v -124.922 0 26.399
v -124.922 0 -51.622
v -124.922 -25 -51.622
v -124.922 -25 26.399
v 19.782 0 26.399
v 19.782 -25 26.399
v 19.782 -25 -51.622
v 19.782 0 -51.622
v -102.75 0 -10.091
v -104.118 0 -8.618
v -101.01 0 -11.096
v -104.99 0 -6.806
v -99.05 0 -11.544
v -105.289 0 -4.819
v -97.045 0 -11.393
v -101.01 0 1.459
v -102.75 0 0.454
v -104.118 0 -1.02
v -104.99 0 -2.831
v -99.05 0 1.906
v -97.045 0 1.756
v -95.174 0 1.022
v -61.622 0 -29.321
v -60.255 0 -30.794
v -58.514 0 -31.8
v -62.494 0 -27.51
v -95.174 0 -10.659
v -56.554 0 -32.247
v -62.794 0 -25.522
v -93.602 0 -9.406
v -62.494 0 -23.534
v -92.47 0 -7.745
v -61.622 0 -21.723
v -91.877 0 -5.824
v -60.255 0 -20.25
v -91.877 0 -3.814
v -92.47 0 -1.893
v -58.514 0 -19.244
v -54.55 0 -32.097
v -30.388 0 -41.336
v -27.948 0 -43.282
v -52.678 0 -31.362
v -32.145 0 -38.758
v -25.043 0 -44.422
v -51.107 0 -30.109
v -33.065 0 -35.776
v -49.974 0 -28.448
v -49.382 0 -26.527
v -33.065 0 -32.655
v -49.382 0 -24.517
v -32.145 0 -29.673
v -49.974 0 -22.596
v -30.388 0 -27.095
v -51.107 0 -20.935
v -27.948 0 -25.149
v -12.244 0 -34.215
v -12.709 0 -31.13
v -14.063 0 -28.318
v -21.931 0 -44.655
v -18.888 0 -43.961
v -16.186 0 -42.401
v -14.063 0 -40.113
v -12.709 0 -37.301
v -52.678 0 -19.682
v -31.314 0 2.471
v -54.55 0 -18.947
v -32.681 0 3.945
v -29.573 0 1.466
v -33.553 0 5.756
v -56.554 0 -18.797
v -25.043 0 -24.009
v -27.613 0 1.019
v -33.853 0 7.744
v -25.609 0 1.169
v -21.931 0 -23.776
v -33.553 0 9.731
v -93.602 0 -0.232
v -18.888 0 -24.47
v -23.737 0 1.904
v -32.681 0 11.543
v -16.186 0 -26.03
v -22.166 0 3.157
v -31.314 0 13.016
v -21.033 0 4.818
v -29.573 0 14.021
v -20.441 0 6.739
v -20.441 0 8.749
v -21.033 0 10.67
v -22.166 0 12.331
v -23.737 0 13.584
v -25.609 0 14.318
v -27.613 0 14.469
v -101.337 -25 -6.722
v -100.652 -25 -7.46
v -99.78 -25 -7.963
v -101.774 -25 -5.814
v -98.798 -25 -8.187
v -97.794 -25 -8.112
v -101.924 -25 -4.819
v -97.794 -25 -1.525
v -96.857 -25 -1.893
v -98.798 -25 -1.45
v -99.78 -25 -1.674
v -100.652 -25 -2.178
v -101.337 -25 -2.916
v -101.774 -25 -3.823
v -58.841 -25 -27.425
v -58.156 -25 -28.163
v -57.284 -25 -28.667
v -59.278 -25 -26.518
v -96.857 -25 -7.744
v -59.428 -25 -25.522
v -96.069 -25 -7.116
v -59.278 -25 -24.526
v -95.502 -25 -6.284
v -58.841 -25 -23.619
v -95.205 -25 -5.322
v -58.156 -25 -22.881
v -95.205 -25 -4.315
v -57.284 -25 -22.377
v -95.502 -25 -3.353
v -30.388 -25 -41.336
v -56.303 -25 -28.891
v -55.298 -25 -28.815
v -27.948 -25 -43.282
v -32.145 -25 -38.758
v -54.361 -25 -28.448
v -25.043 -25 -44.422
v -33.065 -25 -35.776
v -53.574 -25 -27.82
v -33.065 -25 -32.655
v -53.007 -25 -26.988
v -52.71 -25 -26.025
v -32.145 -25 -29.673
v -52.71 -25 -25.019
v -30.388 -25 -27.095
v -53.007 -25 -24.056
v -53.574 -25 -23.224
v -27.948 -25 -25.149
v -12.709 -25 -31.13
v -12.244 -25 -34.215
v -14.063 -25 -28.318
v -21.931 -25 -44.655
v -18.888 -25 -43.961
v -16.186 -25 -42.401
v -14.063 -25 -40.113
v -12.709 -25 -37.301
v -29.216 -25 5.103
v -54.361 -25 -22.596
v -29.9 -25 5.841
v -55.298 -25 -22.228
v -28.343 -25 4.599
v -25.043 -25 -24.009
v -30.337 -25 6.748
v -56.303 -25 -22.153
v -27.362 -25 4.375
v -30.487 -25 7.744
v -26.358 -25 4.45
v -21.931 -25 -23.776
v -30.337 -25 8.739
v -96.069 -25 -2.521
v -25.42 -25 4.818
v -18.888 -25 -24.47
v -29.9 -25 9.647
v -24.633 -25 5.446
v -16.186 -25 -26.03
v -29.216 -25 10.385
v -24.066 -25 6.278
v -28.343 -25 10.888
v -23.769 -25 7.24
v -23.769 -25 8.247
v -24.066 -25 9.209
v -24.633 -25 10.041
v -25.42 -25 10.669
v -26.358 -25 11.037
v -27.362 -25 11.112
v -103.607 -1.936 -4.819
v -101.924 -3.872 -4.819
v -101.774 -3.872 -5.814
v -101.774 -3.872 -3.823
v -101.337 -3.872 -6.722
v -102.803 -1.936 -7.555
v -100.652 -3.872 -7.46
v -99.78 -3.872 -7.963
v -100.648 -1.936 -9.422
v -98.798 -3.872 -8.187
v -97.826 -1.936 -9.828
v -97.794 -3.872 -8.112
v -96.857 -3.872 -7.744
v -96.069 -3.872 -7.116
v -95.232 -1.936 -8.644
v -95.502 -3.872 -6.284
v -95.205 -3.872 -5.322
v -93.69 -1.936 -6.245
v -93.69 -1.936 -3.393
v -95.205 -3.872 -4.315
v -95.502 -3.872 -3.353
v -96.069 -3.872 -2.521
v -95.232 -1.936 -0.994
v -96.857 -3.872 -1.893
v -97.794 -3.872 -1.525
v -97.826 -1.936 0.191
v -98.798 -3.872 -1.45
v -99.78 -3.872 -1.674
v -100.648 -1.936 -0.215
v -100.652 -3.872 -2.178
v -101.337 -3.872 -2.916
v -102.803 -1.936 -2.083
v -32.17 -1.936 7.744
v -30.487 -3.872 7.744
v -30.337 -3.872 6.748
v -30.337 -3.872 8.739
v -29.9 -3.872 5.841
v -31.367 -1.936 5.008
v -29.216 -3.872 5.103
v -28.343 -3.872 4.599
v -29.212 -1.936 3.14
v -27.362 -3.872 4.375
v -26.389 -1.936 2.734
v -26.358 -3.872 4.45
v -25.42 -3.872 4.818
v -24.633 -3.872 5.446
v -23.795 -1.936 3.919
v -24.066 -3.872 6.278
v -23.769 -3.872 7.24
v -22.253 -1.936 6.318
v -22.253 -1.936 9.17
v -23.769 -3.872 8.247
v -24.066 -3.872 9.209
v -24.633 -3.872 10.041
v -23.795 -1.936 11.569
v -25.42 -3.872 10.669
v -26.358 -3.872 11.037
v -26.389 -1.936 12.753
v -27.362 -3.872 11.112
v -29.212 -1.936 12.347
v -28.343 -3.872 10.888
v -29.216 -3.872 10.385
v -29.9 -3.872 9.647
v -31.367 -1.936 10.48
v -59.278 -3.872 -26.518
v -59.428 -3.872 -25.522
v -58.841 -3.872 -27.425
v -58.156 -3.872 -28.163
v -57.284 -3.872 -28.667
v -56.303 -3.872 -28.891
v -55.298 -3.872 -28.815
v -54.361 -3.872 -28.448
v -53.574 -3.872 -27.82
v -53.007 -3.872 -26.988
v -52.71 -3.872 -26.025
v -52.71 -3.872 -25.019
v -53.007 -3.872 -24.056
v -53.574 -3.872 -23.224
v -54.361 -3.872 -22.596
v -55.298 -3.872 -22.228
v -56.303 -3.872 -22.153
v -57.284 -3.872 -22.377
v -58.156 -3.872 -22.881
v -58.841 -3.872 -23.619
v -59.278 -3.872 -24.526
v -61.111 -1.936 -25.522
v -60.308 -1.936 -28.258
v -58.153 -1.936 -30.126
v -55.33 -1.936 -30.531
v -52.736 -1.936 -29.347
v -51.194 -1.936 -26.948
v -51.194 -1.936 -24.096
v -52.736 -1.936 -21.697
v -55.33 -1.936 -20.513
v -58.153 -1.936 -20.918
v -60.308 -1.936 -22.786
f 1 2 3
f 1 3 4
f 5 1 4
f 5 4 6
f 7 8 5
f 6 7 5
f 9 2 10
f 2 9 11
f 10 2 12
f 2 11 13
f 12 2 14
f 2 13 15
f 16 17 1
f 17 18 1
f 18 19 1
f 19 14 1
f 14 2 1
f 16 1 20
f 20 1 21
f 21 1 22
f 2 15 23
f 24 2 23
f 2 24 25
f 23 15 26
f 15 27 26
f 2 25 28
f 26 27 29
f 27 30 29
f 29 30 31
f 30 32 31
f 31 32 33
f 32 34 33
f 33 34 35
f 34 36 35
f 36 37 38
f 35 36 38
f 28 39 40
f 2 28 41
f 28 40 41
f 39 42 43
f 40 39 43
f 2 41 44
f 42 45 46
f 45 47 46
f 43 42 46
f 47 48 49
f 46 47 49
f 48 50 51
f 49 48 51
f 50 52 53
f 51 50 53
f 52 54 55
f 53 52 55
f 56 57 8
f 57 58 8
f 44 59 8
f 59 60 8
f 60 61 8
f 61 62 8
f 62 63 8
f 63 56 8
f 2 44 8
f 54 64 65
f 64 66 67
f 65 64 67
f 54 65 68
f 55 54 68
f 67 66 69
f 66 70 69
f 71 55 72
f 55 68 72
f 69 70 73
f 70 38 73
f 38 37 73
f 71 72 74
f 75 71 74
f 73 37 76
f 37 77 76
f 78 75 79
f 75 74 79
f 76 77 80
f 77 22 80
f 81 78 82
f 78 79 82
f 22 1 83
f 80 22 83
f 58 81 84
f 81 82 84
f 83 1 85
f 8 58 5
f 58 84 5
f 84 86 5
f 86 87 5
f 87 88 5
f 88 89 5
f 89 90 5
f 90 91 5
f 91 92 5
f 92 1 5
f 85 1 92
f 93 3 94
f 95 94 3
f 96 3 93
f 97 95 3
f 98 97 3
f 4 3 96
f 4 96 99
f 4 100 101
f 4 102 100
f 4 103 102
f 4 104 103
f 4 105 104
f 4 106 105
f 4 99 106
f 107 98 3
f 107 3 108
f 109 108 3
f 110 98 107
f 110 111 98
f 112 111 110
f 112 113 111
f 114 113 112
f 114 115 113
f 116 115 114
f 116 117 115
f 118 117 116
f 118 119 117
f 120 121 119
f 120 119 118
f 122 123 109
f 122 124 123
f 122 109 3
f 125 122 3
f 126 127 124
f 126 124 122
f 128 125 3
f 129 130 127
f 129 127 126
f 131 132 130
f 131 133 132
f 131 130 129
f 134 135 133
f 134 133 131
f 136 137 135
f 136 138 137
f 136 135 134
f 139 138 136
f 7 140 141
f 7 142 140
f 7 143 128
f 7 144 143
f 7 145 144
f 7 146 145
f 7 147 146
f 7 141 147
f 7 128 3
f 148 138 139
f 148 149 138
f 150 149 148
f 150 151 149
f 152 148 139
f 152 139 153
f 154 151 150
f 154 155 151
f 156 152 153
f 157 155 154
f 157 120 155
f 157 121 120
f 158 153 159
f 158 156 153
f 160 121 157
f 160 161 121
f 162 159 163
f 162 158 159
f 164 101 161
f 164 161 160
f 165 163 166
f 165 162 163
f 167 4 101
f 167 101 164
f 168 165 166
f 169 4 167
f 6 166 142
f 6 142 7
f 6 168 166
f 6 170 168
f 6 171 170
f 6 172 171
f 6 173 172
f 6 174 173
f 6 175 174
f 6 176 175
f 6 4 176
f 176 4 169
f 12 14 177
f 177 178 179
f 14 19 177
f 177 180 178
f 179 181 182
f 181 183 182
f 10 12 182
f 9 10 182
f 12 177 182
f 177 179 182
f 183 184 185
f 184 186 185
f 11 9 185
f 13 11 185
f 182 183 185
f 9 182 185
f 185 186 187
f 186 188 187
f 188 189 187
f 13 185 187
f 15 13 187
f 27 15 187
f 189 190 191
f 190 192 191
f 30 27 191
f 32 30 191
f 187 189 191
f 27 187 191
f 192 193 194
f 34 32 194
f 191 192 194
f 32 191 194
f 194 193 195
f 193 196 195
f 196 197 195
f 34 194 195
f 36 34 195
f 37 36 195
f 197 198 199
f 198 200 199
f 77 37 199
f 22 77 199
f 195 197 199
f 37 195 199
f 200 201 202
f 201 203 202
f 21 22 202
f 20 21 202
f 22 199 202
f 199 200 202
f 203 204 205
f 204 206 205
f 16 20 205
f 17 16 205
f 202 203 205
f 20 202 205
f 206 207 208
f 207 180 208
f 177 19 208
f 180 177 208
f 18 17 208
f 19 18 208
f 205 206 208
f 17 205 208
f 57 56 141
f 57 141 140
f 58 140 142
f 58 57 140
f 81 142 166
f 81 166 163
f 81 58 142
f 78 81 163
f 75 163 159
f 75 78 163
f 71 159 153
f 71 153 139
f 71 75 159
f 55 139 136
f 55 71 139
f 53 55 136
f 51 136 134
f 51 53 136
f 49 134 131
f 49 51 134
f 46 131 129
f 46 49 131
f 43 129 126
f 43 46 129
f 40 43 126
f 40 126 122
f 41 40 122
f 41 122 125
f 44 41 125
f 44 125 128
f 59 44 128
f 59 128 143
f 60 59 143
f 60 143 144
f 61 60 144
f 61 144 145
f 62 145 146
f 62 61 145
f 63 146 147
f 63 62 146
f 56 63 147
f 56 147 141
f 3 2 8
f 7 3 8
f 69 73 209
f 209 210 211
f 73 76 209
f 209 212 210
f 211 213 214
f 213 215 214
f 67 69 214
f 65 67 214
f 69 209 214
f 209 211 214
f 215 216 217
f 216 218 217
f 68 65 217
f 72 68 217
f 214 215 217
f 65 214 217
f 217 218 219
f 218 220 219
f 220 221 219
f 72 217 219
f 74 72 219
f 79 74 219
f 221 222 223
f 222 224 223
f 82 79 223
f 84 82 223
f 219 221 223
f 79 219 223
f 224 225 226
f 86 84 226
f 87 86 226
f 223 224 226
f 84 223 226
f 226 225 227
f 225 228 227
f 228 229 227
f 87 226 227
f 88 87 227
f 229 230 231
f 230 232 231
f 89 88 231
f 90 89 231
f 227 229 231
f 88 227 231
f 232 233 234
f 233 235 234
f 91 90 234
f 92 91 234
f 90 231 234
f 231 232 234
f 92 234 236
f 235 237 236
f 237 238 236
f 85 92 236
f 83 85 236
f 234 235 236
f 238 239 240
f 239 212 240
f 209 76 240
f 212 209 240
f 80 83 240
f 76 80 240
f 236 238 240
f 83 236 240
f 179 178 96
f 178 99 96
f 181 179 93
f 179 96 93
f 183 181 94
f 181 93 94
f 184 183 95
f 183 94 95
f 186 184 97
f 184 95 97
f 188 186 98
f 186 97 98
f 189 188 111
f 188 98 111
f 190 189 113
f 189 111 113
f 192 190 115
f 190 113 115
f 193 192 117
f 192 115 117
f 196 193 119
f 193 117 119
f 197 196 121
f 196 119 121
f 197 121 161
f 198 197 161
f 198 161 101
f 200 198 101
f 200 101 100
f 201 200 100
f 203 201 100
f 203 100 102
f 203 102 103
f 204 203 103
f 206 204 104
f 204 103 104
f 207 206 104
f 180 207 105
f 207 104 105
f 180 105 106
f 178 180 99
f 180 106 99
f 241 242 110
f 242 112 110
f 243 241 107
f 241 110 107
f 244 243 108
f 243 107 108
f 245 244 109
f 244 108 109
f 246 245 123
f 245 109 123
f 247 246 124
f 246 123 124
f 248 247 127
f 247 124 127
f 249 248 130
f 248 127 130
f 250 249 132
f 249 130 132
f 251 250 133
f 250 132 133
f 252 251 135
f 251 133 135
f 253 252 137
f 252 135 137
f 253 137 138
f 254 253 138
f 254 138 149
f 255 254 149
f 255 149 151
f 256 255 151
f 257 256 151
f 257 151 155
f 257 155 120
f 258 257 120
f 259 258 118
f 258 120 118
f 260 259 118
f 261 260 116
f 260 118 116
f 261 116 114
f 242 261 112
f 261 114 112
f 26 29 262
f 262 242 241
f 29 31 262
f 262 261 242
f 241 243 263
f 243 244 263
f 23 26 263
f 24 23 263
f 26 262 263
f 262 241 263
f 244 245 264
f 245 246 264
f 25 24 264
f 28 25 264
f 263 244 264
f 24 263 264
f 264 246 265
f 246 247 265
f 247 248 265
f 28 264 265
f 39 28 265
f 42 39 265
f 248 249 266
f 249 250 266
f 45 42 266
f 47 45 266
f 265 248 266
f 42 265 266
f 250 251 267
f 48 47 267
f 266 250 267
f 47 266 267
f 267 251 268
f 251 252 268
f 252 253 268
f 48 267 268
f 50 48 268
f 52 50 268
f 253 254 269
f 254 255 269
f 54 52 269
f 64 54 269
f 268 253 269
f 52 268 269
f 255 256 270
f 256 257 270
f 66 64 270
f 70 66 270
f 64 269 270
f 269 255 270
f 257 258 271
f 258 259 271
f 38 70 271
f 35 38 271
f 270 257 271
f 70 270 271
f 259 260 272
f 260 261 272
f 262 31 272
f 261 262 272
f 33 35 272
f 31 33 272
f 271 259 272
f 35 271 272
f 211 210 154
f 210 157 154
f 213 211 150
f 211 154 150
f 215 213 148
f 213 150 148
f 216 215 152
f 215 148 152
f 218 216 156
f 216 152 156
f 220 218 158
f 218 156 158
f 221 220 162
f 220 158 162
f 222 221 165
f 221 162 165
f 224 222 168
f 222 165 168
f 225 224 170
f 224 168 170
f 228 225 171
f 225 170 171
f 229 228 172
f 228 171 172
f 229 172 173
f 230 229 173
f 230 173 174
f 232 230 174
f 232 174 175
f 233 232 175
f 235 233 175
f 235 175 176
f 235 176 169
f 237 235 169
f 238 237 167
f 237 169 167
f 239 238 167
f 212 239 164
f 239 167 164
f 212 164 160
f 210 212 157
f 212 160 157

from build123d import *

# Parameters (mm, degrees)
F0_W           = 144.7047647089
F0_H           = 78.020889312
F0_R           = 10.4690892811
F0_R_2         = 14.6326120323
F1_DEPTH       = 25
F2_D           = 6.7564
F2_CSINK_D     = 13.4874
F2_CSINK_ANGLE = 82
F3_DEPTH       = 25


with BuildPart() as f1:
    # F0 (on Front) → F1 (new body)
    with BuildSketch(Plane.XZ):
        with Locations((-52.569960244, -12.6112531871)):
            Rectangle(F0_W, F0_H)
        with Locations((-22.7131489664, -34.2154763639)):
            Circle(F0_R, mode=Mode.SUBTRACT)
        with Locations((-71.8028619885, -2.9601538554)):
            Circle(F0_R_2, mode=Mode.SUBTRACT)
    extrude(amount=F1_DEPTH)

    # F2 (through all)
    with Locations(Plane(origin=(0, 0, 0), x_dir=(1, 0, 0), z_dir=(0, 1, 0))):
        with Locations((-98.5457673669, 4.8187081702), (-56.0501925647, 25.5219973624), (-27.109246701, -7.7437334694)):
            CounterSinkHole(F2_D / 2, F2_CSINK_D / 2, counter_sink_angle=F2_CSINK_ANGLE)

    # F0 (on Front) → F3 (join)
    with BuildSketch(Plane.XZ):
        with Locations((-71.8028619885, -2.9601538554)):
            Circle(F0_R_2)
    extrude(amount=F3_DEPTH)


solid = f1.part
